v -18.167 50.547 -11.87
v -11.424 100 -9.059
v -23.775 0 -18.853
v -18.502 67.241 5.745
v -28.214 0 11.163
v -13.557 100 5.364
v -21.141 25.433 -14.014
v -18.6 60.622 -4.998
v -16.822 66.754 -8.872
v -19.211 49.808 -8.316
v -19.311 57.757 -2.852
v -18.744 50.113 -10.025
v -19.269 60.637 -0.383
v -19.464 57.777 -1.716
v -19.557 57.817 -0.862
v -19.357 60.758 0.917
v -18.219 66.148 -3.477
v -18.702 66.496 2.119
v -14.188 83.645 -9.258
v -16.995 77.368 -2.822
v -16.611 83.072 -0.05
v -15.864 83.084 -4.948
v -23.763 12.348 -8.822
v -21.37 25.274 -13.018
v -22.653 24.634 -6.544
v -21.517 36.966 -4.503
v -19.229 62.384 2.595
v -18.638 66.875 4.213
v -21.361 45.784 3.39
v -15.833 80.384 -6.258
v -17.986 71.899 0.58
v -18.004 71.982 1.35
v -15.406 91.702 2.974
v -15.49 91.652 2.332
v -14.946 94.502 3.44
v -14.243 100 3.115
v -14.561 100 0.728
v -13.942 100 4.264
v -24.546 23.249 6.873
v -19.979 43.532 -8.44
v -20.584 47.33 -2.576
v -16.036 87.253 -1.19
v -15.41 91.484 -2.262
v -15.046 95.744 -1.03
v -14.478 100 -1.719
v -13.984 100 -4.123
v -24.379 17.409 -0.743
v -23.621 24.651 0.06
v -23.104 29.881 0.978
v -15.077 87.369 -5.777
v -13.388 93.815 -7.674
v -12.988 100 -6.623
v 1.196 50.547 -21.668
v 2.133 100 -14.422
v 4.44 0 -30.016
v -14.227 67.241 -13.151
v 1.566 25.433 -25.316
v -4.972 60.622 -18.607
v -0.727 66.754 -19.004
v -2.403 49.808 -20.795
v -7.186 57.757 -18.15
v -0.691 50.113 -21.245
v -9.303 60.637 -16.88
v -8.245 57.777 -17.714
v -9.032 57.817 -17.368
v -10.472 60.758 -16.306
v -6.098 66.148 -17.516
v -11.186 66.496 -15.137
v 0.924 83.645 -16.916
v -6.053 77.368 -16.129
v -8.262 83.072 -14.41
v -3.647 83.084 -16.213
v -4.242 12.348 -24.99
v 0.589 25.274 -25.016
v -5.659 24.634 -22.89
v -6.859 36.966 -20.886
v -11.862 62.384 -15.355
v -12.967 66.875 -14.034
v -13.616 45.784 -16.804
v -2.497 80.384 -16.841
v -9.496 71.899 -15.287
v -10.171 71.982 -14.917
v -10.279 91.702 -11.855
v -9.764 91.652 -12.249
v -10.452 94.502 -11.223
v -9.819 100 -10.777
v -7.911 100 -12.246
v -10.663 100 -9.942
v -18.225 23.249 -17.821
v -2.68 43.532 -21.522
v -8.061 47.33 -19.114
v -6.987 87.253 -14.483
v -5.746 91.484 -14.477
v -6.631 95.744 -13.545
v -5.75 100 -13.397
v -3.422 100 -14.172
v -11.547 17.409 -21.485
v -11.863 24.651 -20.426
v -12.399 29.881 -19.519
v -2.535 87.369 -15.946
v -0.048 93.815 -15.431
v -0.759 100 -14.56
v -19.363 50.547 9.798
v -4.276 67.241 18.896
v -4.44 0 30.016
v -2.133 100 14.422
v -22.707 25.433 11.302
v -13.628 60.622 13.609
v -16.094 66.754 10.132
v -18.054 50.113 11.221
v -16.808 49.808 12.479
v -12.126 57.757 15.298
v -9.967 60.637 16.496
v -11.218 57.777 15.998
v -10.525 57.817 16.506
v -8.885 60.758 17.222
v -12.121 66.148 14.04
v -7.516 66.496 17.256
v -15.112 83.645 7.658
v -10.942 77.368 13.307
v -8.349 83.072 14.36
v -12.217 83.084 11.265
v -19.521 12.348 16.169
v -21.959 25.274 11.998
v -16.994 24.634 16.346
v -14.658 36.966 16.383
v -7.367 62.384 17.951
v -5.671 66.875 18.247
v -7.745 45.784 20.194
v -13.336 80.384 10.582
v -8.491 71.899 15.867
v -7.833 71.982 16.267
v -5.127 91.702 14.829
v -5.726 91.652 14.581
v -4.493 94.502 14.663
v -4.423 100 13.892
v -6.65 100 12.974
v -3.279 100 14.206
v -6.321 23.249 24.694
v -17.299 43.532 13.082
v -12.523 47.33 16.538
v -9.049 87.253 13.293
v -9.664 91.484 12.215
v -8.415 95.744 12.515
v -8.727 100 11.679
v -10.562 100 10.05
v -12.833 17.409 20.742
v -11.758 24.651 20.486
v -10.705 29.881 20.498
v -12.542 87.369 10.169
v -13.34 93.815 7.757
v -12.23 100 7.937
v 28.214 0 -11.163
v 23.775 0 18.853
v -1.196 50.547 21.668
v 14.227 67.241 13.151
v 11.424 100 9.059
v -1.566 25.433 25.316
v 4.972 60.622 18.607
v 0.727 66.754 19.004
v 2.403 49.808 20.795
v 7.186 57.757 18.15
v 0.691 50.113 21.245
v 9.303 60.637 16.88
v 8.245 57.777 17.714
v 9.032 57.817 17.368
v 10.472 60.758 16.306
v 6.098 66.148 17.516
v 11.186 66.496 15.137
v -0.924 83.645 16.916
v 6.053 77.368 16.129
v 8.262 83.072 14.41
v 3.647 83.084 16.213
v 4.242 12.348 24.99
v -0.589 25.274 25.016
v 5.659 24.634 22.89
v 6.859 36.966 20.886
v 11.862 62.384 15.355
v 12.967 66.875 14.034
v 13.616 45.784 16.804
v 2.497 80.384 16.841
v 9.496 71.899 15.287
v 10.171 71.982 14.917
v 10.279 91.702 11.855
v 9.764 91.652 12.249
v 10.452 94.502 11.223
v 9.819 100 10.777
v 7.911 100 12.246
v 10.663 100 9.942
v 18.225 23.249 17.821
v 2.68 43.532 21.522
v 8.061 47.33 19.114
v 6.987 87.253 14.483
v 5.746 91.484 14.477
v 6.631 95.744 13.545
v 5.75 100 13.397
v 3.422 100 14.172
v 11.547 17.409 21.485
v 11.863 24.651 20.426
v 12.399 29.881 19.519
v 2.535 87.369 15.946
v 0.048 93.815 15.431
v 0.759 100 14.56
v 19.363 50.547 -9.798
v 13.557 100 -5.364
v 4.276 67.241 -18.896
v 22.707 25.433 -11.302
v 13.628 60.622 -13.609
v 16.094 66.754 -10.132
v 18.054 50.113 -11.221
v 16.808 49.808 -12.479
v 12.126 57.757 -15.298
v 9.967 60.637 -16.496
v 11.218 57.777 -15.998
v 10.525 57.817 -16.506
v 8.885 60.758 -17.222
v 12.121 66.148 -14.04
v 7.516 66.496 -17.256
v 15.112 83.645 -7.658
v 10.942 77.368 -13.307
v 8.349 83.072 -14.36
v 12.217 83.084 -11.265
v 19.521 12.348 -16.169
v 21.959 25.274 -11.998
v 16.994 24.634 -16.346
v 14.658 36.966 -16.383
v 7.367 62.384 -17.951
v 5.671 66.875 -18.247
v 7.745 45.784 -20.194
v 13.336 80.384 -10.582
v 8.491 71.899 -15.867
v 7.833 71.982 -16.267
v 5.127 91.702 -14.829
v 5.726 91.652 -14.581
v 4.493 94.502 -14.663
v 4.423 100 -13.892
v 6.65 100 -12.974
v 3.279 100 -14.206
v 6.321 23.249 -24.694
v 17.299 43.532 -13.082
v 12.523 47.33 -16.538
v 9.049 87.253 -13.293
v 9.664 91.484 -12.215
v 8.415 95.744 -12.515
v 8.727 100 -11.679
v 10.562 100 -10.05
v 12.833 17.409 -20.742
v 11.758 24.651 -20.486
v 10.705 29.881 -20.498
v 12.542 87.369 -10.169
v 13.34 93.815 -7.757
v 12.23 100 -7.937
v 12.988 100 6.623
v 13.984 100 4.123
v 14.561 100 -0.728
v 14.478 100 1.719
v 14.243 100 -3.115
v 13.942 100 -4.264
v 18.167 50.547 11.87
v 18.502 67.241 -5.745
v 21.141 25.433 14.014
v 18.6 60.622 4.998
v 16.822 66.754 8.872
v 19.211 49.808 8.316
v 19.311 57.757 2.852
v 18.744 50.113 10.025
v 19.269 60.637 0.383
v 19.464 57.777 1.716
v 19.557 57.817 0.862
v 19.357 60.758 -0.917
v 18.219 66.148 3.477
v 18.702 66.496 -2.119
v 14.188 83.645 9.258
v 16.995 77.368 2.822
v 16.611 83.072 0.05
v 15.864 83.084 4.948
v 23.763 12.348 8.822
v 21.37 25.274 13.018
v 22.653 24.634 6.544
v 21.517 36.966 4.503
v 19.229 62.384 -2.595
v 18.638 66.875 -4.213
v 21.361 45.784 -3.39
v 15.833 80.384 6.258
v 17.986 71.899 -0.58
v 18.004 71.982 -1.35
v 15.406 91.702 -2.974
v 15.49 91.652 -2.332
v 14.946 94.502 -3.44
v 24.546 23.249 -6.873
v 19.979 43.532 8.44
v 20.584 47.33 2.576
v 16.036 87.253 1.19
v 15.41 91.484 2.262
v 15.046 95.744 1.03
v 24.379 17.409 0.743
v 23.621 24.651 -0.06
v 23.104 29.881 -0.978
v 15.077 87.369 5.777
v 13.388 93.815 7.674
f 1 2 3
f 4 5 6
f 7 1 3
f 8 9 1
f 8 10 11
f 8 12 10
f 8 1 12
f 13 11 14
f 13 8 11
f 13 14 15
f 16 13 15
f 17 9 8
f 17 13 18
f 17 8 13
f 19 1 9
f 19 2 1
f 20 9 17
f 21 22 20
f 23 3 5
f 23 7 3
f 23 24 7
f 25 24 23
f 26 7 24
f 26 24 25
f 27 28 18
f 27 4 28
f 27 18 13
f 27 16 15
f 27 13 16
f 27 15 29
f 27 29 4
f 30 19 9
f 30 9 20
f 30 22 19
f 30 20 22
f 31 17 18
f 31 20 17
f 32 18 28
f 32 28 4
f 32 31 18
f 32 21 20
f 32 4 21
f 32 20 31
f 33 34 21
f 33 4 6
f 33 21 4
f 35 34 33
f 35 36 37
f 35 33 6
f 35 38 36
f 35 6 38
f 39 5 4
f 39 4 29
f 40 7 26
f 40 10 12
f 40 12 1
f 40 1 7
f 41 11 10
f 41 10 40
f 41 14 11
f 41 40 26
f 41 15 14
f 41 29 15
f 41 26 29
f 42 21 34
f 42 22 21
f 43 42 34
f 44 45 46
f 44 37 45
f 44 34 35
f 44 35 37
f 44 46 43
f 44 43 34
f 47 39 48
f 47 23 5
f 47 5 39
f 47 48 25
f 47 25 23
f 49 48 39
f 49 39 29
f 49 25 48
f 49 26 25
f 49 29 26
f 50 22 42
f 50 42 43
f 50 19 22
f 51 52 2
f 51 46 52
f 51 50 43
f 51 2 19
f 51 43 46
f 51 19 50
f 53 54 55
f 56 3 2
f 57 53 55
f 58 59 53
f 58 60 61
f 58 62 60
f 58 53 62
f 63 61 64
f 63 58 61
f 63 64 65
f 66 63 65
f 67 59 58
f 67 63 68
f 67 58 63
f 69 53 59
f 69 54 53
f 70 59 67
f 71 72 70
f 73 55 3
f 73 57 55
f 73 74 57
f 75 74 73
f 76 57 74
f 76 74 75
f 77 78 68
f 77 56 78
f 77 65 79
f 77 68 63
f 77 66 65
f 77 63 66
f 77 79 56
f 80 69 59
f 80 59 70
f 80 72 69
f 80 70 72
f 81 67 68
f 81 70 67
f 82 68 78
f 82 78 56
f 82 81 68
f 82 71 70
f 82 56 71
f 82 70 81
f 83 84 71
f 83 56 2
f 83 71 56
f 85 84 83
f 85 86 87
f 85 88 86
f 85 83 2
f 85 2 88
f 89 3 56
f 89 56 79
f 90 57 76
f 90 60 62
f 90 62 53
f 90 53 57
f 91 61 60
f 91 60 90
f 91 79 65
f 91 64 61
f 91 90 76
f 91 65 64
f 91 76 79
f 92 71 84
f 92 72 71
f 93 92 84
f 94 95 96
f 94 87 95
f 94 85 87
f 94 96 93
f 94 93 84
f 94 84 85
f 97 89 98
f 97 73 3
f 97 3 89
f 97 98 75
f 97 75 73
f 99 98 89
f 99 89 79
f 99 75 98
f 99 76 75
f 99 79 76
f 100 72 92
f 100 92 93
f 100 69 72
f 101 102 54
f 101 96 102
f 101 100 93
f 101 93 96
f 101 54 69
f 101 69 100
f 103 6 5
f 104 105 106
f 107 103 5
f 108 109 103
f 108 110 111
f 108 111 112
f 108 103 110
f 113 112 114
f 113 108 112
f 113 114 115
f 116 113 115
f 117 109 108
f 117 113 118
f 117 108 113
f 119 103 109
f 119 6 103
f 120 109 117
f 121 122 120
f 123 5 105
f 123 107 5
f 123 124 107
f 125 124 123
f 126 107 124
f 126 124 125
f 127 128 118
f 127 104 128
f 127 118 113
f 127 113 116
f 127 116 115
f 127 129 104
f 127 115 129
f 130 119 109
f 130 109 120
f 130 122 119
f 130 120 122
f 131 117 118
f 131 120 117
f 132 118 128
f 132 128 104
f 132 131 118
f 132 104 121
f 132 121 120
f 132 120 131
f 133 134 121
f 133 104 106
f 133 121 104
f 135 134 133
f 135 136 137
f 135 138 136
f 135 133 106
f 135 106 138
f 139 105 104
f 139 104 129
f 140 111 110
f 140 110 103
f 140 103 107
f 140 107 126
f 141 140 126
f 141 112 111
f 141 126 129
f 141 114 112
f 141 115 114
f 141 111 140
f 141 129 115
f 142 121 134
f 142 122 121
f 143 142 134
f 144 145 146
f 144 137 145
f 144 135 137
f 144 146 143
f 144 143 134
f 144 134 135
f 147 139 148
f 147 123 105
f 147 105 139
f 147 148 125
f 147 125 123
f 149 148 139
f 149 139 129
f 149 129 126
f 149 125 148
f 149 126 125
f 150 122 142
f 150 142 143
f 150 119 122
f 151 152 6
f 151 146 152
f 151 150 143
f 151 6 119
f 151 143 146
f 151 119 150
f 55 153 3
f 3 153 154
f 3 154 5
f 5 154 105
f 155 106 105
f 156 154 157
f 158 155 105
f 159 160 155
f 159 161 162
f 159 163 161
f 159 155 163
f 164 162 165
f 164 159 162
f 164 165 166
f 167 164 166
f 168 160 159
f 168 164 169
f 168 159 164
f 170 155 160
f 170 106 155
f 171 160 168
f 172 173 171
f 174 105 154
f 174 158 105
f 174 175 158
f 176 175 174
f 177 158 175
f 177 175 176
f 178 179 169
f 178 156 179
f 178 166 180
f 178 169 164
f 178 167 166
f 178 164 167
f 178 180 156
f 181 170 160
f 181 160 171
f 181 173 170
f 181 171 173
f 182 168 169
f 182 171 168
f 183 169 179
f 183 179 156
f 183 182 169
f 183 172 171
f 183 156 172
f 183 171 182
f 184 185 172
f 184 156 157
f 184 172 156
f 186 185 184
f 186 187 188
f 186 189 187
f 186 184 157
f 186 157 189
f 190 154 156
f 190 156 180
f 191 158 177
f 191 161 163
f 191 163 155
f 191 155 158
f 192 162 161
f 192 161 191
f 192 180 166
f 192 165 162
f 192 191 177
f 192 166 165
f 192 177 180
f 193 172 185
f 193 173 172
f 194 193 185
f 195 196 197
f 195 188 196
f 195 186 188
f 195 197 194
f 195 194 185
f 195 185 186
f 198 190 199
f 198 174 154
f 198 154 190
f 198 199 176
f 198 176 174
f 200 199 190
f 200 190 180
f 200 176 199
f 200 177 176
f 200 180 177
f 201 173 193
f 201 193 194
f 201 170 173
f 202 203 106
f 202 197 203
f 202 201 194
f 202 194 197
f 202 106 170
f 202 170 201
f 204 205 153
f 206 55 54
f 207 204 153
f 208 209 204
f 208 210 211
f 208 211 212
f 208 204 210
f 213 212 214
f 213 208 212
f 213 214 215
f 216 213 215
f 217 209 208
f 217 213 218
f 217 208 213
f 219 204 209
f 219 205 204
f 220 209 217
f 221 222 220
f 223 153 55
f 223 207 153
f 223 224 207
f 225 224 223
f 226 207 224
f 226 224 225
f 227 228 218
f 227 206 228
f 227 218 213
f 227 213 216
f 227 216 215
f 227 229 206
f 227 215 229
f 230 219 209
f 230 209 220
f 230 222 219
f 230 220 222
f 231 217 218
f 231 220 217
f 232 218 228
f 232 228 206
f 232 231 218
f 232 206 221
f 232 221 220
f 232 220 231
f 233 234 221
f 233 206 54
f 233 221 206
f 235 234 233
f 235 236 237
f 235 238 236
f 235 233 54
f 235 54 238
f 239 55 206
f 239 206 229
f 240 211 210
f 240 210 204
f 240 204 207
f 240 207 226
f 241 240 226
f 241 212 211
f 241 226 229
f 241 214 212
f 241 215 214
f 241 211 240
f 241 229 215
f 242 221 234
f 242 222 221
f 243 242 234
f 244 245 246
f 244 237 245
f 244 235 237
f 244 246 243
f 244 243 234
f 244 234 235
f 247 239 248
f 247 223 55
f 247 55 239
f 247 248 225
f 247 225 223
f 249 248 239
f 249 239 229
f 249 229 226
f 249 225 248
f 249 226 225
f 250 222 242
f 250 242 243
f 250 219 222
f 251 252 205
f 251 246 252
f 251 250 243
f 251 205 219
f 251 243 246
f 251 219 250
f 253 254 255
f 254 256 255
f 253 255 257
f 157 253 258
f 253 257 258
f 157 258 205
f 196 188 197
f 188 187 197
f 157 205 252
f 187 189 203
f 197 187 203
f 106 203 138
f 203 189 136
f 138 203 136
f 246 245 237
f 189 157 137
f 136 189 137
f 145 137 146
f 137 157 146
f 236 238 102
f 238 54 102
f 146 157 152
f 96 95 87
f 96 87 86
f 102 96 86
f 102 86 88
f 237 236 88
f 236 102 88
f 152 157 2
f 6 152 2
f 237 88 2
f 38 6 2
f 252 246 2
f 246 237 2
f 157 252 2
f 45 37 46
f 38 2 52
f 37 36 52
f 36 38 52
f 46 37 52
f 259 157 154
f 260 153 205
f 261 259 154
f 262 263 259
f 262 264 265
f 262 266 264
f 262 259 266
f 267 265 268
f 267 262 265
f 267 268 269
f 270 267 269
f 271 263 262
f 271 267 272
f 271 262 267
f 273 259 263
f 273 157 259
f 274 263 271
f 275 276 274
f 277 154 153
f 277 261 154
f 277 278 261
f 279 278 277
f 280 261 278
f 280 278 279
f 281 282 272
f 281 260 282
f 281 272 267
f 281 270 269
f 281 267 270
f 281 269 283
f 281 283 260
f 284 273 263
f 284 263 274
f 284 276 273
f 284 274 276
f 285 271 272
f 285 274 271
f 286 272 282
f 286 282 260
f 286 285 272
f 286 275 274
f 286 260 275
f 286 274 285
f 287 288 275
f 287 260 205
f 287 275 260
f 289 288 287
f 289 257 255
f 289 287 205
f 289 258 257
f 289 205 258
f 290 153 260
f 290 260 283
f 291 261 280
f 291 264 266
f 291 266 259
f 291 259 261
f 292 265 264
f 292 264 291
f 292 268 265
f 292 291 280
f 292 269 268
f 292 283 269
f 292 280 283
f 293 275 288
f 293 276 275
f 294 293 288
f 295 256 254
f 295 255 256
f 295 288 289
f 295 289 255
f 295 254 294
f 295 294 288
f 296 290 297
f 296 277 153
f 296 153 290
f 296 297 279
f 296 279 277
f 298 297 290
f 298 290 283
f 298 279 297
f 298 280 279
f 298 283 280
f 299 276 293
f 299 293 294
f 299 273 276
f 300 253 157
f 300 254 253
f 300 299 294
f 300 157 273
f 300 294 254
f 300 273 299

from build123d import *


with BuildPart() as part:
    # Sketch1 → Loft1 section 0
    with BuildSketch(Plane(origin=(0, 0, 0), x_dir=(1, 0, 0), z_dir=(0, 1, 0))):
        Polygon((28.214375639, 11.163079057), (4.439677771, 30.015905584), (-23.774697867, 18.852826527), (-28.214375639, -11.163079057), (-4.439677771, -30.015905584), (23.774697867, -18.852826527), align=None)
    # Sketch2 for Loft1 → Loft1 section 1
    with BuildSketch(Plane(origin=(0, 100, 0), x_dir=(1, 0, 0), z_dir=(0, 1, 0))):
        with BuildLine():
            # circular arc as an exact rational Bezier (weights 1, cos(half-angle), 1)
            Bezier((13.556819541, 5.363785123), (10.460036756, 13.190818534), (2.133235594, 14.422442679), weights=[1, 0.866025404, 1])
            Bezier((2.133235594, 14.422442679), (-6.193565569, 15.654066823), (-11.423583947, 9.058657556), weights=[1, 0.866025404, 1])
            Bezier((-11.423583947, 9.058657556), (-16.653602327, 2.463248289), (-13.556819541, -5.363785123), weights=[1, 0.866025404, 1])
            Bezier((-13.556819541, -5.363785123), (-10.460036756, -13.190818534), (-2.133235594, -14.422442679), weights=[1, 0.866025404, 1])
            Bezier((-2.133235594, -14.422442679), (6.193565569, -15.654066823), (11.423583947, -9.058657556), weights=[1, 0.866025404, 1])
            Bezier((11.423583947, -9.058657556), (16.653602327, -2.463248289), (13.556819541, 5.363785123), weights=[1, 0.866025404, 1])
        make_face()
    loft()


solid = part.part
